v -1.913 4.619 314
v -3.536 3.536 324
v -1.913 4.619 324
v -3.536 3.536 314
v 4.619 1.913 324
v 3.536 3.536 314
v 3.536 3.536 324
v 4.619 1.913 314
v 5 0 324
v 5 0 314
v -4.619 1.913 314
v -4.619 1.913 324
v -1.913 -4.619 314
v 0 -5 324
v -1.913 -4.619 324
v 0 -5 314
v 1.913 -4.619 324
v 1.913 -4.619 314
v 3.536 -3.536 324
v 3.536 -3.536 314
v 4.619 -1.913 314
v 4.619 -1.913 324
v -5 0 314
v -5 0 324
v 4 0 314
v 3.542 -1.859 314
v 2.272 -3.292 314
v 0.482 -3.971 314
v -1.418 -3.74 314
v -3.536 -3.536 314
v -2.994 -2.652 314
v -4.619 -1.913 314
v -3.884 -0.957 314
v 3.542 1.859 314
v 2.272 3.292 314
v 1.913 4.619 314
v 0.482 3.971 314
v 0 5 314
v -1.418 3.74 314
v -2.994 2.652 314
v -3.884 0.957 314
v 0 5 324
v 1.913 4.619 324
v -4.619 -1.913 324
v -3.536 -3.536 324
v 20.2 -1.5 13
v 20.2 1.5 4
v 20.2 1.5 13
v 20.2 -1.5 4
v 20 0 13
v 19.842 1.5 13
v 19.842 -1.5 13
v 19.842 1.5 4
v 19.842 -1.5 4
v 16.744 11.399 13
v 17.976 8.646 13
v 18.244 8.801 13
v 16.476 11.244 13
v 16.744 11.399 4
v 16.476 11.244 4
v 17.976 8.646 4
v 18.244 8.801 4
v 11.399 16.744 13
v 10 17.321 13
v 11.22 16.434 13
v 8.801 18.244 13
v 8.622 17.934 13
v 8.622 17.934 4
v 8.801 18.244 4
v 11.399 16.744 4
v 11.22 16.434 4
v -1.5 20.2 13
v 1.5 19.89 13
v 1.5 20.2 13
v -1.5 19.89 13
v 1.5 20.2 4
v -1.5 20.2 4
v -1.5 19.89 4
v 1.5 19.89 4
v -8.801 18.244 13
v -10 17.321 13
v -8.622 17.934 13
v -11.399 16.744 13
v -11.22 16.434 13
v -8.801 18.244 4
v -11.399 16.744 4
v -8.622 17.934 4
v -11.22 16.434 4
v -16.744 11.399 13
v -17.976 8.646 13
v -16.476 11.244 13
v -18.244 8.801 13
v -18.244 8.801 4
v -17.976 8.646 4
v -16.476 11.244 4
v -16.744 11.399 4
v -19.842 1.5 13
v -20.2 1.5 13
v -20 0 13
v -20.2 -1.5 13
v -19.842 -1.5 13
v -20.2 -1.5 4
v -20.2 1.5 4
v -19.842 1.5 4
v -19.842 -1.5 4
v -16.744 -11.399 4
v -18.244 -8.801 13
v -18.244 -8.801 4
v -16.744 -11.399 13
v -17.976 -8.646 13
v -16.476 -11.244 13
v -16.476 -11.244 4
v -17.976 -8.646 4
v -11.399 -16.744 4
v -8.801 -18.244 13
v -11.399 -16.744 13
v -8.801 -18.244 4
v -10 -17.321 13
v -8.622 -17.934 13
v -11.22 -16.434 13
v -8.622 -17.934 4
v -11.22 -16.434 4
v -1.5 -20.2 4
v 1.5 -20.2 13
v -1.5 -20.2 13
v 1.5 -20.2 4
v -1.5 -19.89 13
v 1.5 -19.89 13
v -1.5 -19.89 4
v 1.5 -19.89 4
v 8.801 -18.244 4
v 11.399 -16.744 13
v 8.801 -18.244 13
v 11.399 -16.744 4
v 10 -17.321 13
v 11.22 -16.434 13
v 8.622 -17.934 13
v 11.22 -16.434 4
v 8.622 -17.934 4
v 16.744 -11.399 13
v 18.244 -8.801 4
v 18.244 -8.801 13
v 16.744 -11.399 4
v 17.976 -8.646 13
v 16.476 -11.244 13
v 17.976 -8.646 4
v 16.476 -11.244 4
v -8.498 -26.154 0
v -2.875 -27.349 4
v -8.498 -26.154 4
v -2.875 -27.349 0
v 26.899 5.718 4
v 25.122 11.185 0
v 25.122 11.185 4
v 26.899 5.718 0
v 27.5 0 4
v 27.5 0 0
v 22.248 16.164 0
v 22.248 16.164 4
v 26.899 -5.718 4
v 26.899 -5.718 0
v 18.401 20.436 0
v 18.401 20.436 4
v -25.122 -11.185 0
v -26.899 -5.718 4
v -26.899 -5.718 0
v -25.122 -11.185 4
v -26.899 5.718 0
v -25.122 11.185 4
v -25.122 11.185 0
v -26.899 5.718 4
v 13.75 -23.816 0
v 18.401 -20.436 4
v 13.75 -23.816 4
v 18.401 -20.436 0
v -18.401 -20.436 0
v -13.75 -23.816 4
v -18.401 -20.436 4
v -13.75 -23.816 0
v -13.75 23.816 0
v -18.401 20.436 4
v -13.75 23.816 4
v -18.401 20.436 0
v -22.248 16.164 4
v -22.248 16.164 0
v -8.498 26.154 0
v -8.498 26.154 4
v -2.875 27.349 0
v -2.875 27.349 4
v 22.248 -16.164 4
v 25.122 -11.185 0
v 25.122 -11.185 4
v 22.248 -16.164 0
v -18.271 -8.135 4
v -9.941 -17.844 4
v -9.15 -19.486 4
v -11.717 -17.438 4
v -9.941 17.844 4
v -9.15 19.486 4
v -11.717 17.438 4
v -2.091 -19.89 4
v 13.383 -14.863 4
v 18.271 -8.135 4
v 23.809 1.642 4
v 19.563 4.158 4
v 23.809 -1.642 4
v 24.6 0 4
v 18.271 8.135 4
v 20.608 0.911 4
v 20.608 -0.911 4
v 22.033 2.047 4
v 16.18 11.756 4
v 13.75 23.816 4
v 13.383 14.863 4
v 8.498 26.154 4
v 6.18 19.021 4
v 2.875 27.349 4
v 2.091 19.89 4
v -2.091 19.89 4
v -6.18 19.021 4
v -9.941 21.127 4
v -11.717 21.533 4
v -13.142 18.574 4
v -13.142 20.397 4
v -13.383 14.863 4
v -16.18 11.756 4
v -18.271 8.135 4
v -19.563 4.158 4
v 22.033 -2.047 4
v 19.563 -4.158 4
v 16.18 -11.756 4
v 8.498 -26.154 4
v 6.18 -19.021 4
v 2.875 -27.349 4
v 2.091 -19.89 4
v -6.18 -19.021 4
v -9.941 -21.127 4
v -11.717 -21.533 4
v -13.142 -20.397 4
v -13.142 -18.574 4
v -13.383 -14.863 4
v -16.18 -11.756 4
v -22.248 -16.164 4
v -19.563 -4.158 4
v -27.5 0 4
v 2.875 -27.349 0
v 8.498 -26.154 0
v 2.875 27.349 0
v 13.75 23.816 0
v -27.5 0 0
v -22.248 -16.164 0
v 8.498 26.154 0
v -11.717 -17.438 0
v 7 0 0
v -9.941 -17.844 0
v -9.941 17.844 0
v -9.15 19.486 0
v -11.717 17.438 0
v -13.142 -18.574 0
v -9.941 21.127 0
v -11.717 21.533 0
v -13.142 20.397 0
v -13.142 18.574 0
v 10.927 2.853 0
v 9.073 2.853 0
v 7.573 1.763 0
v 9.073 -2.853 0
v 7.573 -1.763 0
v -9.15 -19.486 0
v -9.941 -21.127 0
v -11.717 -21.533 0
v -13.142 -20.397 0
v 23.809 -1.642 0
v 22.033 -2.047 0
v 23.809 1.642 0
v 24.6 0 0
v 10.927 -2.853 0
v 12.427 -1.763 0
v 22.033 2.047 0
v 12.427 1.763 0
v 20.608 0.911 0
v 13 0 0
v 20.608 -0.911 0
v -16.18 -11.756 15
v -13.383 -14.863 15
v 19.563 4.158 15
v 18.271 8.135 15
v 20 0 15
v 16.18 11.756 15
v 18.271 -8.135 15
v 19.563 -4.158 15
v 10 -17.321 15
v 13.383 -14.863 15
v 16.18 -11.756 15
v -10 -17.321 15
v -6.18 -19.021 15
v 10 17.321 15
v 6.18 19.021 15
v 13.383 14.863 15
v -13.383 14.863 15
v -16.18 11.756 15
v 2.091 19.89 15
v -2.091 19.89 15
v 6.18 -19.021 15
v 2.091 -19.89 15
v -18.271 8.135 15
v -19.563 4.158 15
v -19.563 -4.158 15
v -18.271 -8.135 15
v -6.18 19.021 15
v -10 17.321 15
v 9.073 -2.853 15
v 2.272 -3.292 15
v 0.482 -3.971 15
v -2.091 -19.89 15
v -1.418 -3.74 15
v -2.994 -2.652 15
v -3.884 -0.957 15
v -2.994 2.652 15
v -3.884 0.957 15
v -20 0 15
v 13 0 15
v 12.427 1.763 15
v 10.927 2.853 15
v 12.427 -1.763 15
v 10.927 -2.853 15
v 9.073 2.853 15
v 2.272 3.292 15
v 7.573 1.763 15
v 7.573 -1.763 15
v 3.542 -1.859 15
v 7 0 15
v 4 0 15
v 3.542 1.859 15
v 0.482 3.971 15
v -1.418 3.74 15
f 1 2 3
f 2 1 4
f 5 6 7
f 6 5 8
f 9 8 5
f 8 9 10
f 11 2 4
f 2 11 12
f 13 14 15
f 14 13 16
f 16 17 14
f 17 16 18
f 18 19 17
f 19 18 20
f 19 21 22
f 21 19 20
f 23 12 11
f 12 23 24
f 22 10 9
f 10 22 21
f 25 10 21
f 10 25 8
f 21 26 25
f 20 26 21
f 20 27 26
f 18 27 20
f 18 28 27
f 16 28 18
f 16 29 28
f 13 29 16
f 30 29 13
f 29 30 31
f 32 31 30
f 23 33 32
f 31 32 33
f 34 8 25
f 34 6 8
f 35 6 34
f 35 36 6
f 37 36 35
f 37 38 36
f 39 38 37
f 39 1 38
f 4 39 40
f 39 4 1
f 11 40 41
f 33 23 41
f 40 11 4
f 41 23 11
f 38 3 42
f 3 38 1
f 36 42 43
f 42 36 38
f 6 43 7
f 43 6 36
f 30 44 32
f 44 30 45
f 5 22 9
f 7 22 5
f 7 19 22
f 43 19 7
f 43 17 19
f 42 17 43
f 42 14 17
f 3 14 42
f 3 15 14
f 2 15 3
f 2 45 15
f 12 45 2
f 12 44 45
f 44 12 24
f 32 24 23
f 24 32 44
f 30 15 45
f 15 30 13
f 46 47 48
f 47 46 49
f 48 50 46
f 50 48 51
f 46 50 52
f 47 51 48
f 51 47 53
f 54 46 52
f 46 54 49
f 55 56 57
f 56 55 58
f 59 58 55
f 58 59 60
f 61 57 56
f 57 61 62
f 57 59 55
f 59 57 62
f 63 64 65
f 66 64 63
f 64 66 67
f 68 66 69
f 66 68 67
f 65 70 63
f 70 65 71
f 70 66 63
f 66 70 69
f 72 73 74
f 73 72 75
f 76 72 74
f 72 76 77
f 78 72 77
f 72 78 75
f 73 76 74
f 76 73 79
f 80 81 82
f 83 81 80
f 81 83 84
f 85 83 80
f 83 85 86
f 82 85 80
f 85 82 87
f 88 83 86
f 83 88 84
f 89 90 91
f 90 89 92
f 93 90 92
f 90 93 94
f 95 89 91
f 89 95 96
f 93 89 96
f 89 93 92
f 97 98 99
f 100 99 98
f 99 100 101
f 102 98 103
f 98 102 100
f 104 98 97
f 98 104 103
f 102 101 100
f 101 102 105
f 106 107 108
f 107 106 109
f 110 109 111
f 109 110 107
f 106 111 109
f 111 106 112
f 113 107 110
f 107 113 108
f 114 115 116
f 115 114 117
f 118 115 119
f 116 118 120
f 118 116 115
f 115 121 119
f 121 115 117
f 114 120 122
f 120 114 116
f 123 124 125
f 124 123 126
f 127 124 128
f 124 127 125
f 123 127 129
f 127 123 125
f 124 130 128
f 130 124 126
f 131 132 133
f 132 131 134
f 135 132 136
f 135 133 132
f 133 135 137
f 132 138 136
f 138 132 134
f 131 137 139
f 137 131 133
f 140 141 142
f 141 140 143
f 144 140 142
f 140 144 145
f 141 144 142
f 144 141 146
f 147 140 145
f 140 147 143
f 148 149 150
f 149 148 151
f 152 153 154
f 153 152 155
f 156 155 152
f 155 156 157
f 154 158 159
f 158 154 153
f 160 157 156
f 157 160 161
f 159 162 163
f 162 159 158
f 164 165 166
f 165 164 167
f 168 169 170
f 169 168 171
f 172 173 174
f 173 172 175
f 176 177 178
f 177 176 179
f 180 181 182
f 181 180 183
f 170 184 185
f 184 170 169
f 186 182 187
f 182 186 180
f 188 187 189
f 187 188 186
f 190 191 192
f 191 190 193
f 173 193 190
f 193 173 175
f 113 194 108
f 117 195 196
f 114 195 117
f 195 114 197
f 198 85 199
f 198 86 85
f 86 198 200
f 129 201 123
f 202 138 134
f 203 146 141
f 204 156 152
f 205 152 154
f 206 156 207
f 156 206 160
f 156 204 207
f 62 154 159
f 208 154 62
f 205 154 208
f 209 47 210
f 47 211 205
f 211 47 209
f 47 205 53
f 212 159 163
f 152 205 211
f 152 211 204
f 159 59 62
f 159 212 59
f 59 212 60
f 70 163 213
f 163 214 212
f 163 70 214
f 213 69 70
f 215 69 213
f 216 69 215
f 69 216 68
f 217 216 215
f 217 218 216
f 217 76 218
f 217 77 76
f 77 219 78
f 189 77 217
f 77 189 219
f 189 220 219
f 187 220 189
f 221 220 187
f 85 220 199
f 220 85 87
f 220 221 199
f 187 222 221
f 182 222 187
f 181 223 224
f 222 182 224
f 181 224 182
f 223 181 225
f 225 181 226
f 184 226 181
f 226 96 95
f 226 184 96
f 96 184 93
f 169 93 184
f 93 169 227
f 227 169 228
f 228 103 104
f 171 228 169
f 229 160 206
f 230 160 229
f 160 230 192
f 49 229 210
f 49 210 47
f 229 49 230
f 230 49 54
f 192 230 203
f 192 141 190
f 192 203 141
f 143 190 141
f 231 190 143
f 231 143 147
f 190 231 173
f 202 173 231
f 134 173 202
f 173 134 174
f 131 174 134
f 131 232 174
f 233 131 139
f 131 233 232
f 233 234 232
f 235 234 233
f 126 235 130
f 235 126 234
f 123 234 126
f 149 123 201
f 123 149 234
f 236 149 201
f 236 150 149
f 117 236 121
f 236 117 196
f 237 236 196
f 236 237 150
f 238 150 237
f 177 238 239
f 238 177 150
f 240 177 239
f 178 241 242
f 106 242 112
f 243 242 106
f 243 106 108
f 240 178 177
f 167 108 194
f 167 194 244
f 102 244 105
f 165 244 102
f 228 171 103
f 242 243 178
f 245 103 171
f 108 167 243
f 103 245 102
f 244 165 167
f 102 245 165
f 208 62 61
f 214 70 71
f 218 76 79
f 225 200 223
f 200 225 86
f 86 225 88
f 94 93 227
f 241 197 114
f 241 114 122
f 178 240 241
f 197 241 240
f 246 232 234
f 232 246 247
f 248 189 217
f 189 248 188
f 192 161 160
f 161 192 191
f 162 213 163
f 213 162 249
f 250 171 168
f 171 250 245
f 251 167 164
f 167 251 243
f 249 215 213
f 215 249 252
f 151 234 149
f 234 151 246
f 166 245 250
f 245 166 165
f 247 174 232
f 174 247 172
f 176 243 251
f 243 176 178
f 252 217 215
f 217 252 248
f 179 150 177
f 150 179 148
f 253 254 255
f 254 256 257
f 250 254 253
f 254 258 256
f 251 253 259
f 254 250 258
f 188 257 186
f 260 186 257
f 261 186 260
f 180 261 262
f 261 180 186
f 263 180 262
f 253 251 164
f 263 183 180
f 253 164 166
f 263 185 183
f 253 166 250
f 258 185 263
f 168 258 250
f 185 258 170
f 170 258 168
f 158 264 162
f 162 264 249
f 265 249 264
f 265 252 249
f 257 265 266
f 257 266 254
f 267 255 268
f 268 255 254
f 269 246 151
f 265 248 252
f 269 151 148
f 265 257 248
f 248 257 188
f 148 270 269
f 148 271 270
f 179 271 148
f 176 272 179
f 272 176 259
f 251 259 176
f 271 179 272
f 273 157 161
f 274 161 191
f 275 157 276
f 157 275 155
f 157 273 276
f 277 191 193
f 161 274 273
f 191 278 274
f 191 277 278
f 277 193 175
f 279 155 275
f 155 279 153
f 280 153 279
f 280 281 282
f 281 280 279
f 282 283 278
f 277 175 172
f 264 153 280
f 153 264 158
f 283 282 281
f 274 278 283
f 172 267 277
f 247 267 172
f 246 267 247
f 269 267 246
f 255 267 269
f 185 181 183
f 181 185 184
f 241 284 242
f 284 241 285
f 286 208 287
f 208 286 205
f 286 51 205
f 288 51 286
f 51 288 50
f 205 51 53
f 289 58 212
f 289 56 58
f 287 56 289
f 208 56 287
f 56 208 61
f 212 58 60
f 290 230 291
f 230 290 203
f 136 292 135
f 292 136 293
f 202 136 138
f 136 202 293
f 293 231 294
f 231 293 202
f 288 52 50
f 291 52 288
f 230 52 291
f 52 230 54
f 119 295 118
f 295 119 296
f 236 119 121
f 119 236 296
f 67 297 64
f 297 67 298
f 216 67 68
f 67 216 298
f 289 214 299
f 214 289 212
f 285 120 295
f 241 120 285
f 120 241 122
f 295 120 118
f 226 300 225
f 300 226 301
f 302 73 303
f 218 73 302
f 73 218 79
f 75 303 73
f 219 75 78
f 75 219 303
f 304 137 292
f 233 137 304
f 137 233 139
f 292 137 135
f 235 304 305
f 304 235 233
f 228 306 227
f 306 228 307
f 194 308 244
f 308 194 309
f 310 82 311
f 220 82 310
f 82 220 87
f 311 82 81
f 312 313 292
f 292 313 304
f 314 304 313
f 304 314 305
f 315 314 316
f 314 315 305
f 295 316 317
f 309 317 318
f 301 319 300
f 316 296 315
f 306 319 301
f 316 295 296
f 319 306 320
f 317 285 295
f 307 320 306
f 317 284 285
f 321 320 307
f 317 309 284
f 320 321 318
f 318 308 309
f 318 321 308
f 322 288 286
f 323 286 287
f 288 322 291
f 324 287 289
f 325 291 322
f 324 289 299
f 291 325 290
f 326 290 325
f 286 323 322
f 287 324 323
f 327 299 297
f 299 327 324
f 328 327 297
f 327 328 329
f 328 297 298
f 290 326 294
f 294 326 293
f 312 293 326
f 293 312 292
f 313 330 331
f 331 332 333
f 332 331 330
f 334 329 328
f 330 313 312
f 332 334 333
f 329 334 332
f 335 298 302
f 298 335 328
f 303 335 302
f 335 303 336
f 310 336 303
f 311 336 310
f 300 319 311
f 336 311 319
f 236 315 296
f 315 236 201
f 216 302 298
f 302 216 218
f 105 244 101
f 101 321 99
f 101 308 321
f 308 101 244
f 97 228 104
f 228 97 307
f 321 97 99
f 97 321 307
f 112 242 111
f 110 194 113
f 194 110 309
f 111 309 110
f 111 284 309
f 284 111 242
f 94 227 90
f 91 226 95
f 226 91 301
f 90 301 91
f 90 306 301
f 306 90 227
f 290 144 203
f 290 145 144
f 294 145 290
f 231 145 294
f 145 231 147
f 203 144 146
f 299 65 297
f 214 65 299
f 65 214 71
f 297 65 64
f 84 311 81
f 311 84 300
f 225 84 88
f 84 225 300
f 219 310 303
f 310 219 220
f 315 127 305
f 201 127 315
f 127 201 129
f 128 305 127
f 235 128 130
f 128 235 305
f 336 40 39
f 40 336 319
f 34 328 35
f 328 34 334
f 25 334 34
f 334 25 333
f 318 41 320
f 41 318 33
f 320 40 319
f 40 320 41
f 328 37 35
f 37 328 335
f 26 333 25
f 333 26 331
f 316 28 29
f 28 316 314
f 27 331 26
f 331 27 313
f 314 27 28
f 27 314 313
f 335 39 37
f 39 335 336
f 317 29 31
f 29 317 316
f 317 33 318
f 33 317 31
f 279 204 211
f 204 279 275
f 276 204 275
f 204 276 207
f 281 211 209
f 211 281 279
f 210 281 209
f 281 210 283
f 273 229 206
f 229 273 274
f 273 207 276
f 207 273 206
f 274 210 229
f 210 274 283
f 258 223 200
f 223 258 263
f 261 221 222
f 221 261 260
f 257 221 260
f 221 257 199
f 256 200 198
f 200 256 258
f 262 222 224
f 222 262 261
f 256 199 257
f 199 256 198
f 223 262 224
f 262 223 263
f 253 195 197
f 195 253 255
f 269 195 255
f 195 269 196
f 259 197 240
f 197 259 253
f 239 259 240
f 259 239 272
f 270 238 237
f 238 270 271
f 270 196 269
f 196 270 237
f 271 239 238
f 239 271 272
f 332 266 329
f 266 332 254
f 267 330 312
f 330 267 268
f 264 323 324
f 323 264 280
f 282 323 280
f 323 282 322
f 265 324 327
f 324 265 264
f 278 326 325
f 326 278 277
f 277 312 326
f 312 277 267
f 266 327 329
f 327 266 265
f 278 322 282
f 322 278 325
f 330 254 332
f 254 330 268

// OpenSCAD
// Parameters
mast_h = 300; //[150:600:1]
mast_d = 8; //[4:16:0.5]
base_d = 40; //[20:80:1]
base_h = 12; //[6:24:1]
flange_d = 55; //[30:110:1]
flange_h = 4; //[2:10:0.5]
hole_count = 3; //[2:8:1]
hole_d = 4.2; //[2.5:8:0.1]
hole_circle_d = 45; //[25:90:1]
tip_cap_h = 10; //[5:25:1]
tip_cap_d = 10; //[6:20:0.5]
cable_hole_d = 6; //[3:12:0.5]
cable_hole_offset = 10; //[0:25:1]
rib_count = 12; //[6:24:1]
rib_depth = 1.2; //[0.5:3:0.1]
rib_width = 3; //[1:6:0.5]
rib_h = 10; //[4:20:1]
overlap = 1; //[0.5:2:0.1]

// Base Shapes
module flange_cyl() {
  translate([0, 0, flange_h/2])
    cylinder(r=flange_d/2, h=flange_h, center=true);
}

module base_cyl() {
  translate([0, 0, flange_h + base_h/2 - overlap])
    cylinder(r=base_d/2, h=base_h, center=true);
}

module mast_cyl() {
  translate([0, 0, flange_h + base_h - overlap + mast_h/2 - overlap])
    cylinder(r=mast_d/2, h=mast_h, center=true);
}

module tip_cap_sphere() {
  translate([0, 0, flange_h + base_h - overlap + mast_h - overlap + tip_cap_h/2])
    sphere(r=tip_cap_d/2, center=true);
}

module tip_cap_cyl() {
  translate([0, 0, flange_h + base_h - overlap + mast_h - overlap + tip_cap_h/2])
    cylinder(r=tip_cap_d/2, h=tip_cap_h, center=true);
}

module mount_hole(pos) {
  translate(pos)
    cylinder(r=hole_d/2, h=flange_h + base_h + overlap*2, center=true);
}

module cable_exit_hole() {
  translate([cable_hole_offset, 0, (flange_h + base_h)/2])
    cylinder(r=cable_hole_d/2, h=flange_h + base_h + overlap*2, center=true);
}

module rib(pos, rot) {
  translate(pos)
  rotate([0, 0, rot])
    cube([rib_depth, rib_width, rib_h], center=true);
}

// Operations
module tip_cap_union() {
  union() {
    tip_cap_cyl();
    tip_cap_sphere();
  }
}

module antenna_solid_union() {
  union() {
    flange_cyl();
    base_cyl();
    mast_cyl();
    tip_cap_union();
    for (i = [0:rib_count-1]) {
      rib([(base_d/2 + rib_depth/2 - overlap)*cos(i*360/rib_count),
           (base_d/2 + rib_depth/2 - overlap)*sin(i*360/rib_count),
           flange_h + rib_h/2 - overlap], i*360/rib_count);
    }
  }
}

module mount_holes_union() {
  union() {
    for (i = [0:hole_count-1]) {
      mount_hole([(hole_circle_d/2)*cos(i*360/hole_count),
                  (hole_circle_d/2)*sin(i*360/hole_count),
                  (flange_h + base_h)/2]);
    }
  }
}

module holes_union_all() {
  union() {
    mount_holes_union();
    cable_exit_hole();
  }
}

// Final Output
difference() {
  antenna_solid_union();
  holes_union_all();
}
